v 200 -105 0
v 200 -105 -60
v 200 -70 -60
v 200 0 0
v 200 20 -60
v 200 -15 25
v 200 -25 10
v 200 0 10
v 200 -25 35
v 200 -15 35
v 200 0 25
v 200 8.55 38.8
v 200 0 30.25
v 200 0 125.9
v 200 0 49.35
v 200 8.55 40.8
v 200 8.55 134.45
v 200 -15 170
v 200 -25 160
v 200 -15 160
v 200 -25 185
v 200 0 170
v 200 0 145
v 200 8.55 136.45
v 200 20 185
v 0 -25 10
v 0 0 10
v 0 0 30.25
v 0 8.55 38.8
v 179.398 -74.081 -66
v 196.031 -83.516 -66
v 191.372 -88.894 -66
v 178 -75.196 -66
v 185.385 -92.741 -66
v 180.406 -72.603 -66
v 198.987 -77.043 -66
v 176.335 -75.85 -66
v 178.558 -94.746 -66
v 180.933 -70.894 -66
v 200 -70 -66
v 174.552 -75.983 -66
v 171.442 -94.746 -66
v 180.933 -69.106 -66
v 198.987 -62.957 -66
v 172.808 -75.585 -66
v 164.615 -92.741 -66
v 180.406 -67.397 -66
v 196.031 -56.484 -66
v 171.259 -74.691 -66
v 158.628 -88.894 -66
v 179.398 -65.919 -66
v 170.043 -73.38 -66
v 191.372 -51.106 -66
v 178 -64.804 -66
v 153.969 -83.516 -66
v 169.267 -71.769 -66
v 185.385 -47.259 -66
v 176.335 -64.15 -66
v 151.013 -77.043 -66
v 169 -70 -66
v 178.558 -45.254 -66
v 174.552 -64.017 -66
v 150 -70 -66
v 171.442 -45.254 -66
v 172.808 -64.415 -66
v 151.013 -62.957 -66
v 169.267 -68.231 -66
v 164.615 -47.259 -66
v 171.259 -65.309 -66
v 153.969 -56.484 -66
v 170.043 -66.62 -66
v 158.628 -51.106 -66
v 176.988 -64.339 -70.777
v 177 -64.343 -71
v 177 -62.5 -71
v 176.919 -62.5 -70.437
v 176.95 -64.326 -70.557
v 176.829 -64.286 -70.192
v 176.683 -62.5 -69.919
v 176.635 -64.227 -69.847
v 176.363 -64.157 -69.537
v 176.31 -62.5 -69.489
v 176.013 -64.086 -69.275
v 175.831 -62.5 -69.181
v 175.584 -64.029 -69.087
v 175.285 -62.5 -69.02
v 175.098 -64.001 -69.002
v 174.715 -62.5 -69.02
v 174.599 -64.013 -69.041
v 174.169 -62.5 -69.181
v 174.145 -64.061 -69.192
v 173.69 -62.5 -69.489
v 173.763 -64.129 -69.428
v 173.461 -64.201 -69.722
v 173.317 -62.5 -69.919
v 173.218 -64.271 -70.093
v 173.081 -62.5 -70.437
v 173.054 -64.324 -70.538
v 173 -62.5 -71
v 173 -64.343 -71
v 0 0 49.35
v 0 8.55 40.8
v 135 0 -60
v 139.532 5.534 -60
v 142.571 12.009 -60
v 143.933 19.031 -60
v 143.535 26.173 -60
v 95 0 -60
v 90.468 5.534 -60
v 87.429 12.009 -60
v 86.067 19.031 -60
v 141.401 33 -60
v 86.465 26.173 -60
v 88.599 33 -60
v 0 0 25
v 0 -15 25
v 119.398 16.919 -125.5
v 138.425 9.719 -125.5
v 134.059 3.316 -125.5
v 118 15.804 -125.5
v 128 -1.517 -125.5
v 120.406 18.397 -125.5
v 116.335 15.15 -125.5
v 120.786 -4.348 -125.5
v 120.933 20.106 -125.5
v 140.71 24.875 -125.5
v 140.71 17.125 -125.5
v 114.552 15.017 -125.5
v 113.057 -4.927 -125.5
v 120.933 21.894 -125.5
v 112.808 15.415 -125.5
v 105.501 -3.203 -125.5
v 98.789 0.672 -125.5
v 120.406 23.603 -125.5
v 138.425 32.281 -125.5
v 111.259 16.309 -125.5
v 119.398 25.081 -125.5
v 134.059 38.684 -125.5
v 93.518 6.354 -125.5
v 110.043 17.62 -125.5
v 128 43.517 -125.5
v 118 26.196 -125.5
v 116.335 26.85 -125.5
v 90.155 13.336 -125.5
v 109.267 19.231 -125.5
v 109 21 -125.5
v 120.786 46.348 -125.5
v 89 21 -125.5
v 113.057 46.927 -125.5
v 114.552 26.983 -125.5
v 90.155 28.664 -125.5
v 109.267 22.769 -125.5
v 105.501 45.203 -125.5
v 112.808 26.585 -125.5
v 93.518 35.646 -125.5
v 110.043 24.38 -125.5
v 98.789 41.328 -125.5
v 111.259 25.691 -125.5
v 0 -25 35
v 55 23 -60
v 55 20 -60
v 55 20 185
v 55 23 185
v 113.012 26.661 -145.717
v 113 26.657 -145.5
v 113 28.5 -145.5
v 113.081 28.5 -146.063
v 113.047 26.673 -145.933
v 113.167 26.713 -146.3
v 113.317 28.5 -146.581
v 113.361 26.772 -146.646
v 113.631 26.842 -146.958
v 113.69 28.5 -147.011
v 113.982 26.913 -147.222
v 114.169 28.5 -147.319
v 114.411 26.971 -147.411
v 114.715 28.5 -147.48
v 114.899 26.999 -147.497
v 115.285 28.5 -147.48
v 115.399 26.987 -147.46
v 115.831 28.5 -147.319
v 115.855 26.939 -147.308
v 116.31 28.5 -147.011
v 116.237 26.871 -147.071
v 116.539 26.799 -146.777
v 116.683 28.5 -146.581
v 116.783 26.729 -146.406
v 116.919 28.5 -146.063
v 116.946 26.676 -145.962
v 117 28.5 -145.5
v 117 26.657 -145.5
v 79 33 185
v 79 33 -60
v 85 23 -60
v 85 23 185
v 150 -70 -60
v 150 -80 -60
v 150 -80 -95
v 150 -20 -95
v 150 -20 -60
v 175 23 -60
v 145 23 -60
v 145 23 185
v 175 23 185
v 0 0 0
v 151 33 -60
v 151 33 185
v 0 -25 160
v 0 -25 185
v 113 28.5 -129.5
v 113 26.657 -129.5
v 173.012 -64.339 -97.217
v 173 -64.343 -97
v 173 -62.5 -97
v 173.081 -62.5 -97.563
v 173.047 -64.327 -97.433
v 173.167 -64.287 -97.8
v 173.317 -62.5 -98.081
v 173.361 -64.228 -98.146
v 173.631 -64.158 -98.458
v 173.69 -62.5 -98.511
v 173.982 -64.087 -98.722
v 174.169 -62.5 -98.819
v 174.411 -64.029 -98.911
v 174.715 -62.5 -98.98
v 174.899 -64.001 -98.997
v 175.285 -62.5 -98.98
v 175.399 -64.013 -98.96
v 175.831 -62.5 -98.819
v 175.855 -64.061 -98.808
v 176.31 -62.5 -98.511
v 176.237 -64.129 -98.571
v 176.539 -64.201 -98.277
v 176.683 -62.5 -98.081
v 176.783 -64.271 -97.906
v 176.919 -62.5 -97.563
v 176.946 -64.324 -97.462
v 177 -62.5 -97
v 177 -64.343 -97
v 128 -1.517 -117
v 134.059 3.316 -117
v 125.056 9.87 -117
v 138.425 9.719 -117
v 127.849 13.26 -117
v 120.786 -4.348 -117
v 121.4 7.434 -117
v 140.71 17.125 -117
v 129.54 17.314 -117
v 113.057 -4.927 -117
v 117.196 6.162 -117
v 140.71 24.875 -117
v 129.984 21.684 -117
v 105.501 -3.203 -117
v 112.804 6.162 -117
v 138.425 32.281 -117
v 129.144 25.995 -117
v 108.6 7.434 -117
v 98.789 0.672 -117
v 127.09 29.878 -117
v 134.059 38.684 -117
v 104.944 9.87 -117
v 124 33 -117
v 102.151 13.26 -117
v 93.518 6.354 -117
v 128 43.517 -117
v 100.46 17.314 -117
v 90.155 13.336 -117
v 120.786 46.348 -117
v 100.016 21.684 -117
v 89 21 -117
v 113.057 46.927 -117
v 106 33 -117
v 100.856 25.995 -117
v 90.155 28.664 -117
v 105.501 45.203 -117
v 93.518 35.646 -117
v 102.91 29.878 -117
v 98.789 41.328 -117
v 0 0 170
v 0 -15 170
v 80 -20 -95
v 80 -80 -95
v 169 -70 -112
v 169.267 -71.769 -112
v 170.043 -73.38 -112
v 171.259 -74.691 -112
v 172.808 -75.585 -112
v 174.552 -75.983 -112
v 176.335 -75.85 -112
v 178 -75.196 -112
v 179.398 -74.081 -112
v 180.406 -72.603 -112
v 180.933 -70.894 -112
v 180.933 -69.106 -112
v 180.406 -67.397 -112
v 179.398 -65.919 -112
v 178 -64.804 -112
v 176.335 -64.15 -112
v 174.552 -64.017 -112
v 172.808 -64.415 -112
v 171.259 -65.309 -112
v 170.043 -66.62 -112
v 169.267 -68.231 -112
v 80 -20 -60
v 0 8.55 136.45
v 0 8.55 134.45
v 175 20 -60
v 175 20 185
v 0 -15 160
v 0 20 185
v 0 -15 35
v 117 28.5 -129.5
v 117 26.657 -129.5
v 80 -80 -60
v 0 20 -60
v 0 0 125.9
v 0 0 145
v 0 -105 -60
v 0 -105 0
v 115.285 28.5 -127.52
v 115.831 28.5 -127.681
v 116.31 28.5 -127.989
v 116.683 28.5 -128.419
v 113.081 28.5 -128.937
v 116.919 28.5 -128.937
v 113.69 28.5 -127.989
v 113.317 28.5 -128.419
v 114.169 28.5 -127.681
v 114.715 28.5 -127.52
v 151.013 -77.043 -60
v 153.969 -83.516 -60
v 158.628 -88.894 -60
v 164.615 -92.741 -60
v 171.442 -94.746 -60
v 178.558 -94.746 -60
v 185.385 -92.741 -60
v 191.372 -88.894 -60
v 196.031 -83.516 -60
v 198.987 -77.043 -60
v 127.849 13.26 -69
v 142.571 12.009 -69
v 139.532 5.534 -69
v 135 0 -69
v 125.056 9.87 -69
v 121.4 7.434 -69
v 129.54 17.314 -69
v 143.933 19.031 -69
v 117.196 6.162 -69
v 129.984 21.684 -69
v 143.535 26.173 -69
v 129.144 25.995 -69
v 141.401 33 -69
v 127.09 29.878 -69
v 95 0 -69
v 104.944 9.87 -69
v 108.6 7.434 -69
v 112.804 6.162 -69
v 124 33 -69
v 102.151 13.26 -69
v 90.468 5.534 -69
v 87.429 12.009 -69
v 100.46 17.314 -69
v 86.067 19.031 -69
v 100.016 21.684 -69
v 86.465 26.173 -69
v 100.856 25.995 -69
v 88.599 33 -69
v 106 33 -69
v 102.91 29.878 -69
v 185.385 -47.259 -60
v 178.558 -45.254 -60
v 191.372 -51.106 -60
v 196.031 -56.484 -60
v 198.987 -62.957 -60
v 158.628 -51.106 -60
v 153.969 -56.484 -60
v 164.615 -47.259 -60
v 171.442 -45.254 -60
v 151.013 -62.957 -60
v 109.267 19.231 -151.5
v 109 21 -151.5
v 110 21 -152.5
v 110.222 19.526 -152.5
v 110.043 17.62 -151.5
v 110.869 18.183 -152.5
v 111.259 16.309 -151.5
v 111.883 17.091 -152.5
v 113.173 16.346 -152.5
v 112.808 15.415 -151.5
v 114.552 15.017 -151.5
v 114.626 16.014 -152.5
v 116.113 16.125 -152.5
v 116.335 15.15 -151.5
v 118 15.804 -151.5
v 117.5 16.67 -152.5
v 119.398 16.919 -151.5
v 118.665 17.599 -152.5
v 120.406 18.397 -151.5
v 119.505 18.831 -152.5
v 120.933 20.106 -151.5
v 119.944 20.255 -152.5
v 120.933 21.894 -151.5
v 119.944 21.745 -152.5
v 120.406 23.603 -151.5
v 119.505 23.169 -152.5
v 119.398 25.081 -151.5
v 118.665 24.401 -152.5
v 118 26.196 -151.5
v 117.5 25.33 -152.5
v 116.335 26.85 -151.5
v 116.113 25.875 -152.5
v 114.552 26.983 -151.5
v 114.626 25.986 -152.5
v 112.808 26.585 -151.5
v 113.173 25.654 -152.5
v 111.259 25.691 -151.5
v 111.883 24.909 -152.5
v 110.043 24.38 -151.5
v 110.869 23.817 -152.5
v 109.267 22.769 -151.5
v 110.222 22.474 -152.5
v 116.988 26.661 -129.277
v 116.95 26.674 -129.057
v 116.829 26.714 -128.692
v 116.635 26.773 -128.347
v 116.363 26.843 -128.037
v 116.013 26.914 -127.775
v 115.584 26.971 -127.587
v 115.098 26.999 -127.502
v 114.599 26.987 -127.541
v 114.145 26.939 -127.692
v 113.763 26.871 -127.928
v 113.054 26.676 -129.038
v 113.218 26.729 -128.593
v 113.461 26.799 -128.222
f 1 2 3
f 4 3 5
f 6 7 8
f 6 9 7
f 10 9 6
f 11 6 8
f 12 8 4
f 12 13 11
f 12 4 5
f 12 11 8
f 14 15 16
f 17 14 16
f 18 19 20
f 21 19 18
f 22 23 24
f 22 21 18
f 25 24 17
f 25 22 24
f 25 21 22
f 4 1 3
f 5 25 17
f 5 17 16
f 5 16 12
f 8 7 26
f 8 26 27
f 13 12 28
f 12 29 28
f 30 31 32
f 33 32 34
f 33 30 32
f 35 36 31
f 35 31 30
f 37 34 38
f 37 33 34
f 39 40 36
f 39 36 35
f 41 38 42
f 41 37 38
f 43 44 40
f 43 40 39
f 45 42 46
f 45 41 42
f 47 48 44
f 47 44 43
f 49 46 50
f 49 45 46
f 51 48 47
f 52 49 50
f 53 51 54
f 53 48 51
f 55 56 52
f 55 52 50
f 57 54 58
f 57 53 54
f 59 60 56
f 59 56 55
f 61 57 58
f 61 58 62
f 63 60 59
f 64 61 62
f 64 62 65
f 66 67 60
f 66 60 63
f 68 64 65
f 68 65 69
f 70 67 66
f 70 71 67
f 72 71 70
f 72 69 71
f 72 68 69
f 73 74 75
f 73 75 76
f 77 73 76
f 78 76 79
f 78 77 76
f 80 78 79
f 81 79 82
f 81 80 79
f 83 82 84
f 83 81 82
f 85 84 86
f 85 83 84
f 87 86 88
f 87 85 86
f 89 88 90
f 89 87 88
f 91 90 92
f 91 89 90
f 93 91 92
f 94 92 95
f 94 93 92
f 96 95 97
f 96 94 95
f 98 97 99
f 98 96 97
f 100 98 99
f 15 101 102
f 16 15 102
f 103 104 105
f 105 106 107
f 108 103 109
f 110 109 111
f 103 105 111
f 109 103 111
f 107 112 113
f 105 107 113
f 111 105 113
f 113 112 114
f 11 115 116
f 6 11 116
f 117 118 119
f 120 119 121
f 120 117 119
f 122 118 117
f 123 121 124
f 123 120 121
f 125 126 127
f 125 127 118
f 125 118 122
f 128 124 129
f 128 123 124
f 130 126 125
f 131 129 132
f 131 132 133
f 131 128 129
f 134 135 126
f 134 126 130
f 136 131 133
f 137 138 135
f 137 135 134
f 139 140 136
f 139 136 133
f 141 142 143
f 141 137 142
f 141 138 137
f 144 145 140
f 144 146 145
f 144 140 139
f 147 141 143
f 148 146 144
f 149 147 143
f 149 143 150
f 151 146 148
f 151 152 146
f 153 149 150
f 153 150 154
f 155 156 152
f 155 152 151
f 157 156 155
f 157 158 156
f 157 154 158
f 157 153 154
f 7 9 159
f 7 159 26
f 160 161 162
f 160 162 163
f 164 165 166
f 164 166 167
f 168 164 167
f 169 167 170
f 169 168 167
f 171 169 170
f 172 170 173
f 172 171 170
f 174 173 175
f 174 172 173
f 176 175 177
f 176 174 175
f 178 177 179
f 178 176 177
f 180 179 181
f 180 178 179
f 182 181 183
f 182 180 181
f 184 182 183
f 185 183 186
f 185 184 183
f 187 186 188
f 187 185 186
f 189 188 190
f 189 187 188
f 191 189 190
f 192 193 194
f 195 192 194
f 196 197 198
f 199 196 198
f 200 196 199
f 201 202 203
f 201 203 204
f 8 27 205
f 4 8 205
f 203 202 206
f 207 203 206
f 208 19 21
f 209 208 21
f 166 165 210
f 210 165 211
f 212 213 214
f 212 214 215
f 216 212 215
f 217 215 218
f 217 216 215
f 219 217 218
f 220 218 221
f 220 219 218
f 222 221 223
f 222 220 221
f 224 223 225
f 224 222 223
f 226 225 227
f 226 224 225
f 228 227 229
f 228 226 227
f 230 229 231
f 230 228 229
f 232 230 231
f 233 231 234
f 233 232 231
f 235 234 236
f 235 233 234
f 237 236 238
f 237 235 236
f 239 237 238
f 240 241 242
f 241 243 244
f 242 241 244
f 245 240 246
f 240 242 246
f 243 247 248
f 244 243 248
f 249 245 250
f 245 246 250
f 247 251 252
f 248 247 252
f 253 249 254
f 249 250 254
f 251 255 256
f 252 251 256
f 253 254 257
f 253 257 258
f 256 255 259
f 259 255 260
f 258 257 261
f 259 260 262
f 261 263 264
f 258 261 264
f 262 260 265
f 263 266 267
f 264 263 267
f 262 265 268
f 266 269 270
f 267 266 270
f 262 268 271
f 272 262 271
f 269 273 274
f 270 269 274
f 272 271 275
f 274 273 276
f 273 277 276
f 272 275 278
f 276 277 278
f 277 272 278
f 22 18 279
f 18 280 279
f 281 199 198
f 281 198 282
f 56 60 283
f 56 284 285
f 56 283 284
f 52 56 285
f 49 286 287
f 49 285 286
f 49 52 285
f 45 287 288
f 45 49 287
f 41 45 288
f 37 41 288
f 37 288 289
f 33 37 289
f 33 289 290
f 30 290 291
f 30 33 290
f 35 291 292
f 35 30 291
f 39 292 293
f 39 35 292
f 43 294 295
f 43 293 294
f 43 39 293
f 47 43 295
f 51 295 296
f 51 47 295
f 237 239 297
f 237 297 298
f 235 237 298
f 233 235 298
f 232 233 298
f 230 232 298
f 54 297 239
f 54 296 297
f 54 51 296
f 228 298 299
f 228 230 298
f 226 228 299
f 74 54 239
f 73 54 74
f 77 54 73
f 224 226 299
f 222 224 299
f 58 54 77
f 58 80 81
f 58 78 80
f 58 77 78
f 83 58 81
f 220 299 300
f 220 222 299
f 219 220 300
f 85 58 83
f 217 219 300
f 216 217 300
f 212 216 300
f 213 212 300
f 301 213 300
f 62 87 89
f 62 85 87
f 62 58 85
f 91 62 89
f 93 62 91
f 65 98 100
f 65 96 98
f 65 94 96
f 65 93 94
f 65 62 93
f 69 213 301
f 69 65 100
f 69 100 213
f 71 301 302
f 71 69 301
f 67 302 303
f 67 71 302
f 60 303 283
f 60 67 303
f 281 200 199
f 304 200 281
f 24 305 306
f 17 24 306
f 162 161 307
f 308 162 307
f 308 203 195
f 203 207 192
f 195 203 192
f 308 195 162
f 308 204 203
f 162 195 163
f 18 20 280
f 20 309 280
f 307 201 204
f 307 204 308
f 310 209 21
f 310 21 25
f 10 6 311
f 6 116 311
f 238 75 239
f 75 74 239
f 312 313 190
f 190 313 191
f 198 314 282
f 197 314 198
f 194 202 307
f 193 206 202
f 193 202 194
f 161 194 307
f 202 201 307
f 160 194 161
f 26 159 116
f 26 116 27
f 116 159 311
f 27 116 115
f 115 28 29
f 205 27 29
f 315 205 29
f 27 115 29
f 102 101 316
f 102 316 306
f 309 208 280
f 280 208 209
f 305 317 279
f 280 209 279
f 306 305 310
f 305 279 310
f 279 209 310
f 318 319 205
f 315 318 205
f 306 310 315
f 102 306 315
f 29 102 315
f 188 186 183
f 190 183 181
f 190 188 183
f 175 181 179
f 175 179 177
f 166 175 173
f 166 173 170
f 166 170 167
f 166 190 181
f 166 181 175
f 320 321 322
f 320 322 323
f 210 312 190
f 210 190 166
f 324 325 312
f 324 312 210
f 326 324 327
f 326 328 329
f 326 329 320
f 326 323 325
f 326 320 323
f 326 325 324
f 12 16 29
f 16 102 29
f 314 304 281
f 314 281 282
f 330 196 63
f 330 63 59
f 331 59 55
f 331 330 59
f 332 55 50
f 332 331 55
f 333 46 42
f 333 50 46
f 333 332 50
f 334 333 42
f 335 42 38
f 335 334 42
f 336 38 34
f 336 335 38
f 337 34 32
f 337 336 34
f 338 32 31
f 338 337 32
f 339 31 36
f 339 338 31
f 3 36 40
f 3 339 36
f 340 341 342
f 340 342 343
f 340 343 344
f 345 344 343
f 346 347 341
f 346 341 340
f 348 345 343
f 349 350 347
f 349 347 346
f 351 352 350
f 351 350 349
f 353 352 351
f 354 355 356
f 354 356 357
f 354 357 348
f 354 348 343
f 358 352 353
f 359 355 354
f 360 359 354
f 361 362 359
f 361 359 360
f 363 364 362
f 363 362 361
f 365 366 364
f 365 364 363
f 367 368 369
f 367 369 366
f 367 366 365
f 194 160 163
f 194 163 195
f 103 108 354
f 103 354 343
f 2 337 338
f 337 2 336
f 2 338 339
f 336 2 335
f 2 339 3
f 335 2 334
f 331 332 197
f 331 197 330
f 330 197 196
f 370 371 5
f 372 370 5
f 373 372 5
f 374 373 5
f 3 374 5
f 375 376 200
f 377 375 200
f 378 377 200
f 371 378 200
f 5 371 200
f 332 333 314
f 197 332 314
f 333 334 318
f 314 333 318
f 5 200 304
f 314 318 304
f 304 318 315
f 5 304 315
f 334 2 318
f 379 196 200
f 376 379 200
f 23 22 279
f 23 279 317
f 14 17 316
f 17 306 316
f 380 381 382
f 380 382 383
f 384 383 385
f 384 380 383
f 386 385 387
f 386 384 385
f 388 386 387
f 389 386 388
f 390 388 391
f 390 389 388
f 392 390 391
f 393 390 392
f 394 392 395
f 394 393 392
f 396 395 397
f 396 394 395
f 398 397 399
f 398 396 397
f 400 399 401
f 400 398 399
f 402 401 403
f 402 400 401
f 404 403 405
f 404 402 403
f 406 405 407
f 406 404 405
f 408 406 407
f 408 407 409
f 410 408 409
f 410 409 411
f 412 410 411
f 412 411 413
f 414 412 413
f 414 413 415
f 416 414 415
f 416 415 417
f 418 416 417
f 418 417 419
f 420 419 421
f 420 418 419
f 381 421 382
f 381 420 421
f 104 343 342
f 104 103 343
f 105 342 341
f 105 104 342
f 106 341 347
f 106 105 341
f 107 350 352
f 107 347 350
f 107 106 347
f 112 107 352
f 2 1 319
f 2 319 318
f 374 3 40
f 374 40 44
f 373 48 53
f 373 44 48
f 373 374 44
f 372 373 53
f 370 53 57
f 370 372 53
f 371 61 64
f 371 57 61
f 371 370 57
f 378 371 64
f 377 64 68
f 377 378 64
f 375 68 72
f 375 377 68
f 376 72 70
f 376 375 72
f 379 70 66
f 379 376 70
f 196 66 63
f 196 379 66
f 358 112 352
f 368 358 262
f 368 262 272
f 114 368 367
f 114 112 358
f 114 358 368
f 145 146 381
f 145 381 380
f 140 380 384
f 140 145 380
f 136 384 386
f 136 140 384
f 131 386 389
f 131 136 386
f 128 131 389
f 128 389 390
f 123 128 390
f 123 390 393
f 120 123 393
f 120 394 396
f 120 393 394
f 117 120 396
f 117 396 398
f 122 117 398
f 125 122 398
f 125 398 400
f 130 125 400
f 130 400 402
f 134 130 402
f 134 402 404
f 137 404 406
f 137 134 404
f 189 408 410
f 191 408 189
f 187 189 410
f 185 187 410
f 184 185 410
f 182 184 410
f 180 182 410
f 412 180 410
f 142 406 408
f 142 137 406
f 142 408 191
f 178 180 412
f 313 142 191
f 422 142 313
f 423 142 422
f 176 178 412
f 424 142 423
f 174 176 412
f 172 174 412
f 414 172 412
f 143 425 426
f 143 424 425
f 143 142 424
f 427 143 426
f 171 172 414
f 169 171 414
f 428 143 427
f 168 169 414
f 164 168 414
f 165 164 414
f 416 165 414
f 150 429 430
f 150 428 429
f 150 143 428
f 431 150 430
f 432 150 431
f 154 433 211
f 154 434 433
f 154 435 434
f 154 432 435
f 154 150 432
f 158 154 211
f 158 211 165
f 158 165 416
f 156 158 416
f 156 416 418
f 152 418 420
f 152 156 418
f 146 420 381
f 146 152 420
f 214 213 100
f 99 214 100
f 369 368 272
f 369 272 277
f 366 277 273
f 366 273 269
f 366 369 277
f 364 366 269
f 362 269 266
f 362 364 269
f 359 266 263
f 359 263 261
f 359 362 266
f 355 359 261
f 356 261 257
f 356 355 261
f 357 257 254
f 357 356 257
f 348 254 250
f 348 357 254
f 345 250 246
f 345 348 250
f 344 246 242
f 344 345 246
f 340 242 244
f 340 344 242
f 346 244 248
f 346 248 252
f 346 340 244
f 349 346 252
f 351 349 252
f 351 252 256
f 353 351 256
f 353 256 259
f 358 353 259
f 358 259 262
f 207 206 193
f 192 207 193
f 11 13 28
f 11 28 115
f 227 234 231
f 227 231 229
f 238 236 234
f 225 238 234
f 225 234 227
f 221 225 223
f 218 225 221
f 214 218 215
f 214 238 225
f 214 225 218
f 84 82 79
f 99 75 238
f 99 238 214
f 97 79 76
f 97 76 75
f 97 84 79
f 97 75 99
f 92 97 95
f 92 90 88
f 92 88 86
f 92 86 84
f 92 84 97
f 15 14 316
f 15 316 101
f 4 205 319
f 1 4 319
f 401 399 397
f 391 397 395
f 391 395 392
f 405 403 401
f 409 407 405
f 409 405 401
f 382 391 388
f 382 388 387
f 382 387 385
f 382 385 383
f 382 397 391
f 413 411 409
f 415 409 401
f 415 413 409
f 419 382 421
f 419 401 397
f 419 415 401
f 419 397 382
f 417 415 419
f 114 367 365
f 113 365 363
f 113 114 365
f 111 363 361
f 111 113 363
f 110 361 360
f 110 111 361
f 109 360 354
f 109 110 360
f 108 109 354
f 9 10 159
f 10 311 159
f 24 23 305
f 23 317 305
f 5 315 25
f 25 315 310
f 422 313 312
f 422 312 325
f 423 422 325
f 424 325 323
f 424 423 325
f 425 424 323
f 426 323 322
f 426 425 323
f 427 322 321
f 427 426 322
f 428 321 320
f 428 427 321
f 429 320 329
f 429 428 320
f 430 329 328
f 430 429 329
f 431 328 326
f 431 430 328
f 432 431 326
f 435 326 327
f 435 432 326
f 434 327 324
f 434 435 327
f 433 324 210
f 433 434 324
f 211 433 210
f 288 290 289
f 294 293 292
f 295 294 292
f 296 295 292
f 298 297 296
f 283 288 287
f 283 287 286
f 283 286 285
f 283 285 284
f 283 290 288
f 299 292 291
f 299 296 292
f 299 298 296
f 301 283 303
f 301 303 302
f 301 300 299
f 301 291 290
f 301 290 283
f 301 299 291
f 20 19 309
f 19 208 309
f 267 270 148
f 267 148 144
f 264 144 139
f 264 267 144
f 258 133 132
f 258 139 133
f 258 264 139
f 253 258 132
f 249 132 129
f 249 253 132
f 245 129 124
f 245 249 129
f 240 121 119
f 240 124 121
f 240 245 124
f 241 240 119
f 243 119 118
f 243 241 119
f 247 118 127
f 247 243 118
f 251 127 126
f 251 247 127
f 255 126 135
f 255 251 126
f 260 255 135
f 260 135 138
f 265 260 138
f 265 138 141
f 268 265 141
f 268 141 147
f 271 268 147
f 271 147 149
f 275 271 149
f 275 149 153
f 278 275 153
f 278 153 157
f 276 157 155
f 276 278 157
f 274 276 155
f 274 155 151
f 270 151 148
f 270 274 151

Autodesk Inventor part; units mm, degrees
ref_plane "YZ Plane" through (0, 0, 0) normal (1, 0, 0) x (0, 1, 0)
sketch "Sketch1" plane through (0, 0, 0) normal (1, 0, 0) x (0, 1, 0)
  line L0 (0, 0) -> (-105, 0)
  line L1 (-105, 0) -> (-105, -60)
  line L2 (-105, -60) -> (20, -60)
  line L3 (20, -60) -> (20, 185)
  line L4 (20, 185) -> (-15.7857, 185)
  line L5 (0, 145) -> (8.55, 136.45)
  line L6 (8.55, 136.45) -> (8.55, 134.45)
  line L7 (8.55, 134.45) -> (0, 125.9)
  line L8 (0, 125.9) -> (0, 49.35)
  line L9 (0, 49.35) -> (8.55, 40.8)
  line L10 (8.55, 40.8) -> (8.55, 38.8)
  line L11 (8.55, 38.8) -> (0, 30.25)
  line L12 (0, 30.25) -> (0, 25)
  line L13 (0, 25) -> (-15, 25)
  line L14 (-15, 25) -> (-15, 35)
  line L15 (-15, 35) -> (-25, 35)
  line L16 (-25, 35) -> (-25, 10)
  line L17 (-25, 10) -> (0, 10)
  line L18 (0, 10) -> (0, 0)
  line L19 (-25, 160) -> (-25, 185)
  line L20 (-25, 185) -> (-15.7857, 185)
  line L21 (-25, 160) -> (-15, 160)
  line L22 (-15, 160) -> (-15, 170)
  line L23 (-15, 170) -> (0, 170)
  line L24 (0, 170) -> (0, 145)
  line L25 (0, 145) -> (0, 136.45) construction
  line L26 (0, 136.45) -> (8.55, 136.45) construction
  line L27 (0, 125.9) -> (0, 134.45) construction
  line L28 (0, 134.45) -> (8.55, 134.45) construction
  line L29 (0, 49.35) -> (0, 40.8) construction
  line L30 (0, 40.8) -> (8.55, 40.8) construction
  line L31 (0, 30.25) -> (0, 38.8) construction
  line L32 (0, 38.8) -> (8.55, 38.8) construction
  dimension "d0" = 245
  dimension "d1" = 125
  dimension "d2" = 60
  dimension "d3" = 45
  dimension "d4" = 20
  dimension "d5" = 10
  dimension "d6" = 15
  dimension "d7" = 15
  dimension "d8" = 25
  dimension "d9" = 25
  dimension "d10" = 10
  dimension "d11" = 40
  dimension "d14" = 114.75
  dimension "d15" = 2
  dimension "d16" = 8.55
extrude "Extrusion1" add sketch "Sketch1" along normal blind 200
sketch "Sketch2" plane through (0, -105, -60) normal (0, 0, -1) x (-1, 0, 0)
  line L0 (0, 125) -> (-200, 125) projected
  line L1 (-175, 125) -> (-55, 125)
  line L2 (-55, 125) -> (-55, 128)
  line L3 (-55, 128) -> (-175, 128)
  line L4 (-175, 128) -> (-175, 125)
  line L5 (-145, 128) -> (-151, 138)
  line L6 (-151, 138) -> (-79, 138)
  line L7 (-79, 138) -> (-85, 128)
  line L8 (-200, 0) -> (-200, 125) projected
  line L9 (-115, 138) -> (-115, 128) construction
  point P0 (0, 105)
  dimension "d17" = 25
  dimension "d18" = 120
  dimension "d19" = 3
  dimension "d20" = 10
  dimension "d21" = 72
  dimension "d22" = 6
  dimension "d23" = 6
extrude "Extrusion2" add sketch "Sketch2" against normal up to surface (245 mm away) separate body
sketch "Sketch3" plane through (0, -105, -60) normal (0, 0, -1) x (-1, 0, 0)
  line L0 (-150, 85) -> (-80, 85)
  line L1 (-80, 85) -> (-80, 25)
  line L2 (-80, 25) -> (-150, 25)
  line L3 (-150, 25) -> (-150, 85)
  line L4 (-200, 0) -> (-200, 125) projected
  line L5 (0, 0) -> (-200, 0) projected
  point P0 (0, 105)
  dimension "d26" = 70
  dimension "d27" = 60
  dimension "d28" = 50
  dimension "d29" = 25
extrude "Extrusion3" add sketch "Sketch3" along normal blind 35 bodies 1
sketch "Sketch5" plane through (0, -105, -60) normal (0, 0, -1) x (-1, 0, 0)
  circle A0 centre (-115, 126) radius 29
  circle A1 centre (-115, 126) radius 15
  line L0 (-56.8289, 105) -> (-173.1711, 105)
  line L1 (-173.1711, 105) -> (-173.1711, 138)
  line L2 (-173.1711, 138) -> (-56.8289, 138)
  line L3 (-56.8289, 138) -> (-56.8289, 105)
  line L4 (-56.8289, 105) -> (-173.1711, 138) construction
  line L5 (-173.1711, 105) -> (-56.8289, 138) construction
  line L6 (-144.4606, 111) -> (-81.6028, 111) construction
  line L7 (-79, 138) -> (-151, 138) construction
  line L8 (-115, 138) -> (-115, 126) construction
  point P0 (0, 105)
  point P1 (-115, 121.5)
  point P2 (-88.5992, 138)
  point P3 (-106, 138)
  point P4 (-124, 138)
  point P5 (-141.4008, 138)
  point P6 (-135, 105)
  point P7 (-95, 105)
  dimension "d32" = 58
  dimension "d33" = 30
  dimension "d34" = 33
  dimension "d35" = 27
extrude "Extrusion4" add sketch "Sketch5" along normal blind 9 separate body contours A0 L0 L2 A1
extrude "Extrusion5" add sketch "Sketch5" along normal blind 57 contours A1 L2 picked at (-114.6834, 128.2311) bodies 3
sketch "Sketch6" plane through (0, -105, -117) normal (0, 0, -1) x (-1, 0, 0)
  arc A0 (-124, 138) -> (-106, 138) centre (-115, 126) ccw projected
  circle A1 centre (-115, 126) radius 26
  point P0 (0, 105)
  dimension "d40" = 52
extrude "Extrusion6" add sketch "Sketch6" along normal blind 8.5 bodies 3
sketch "Sketch7" plane through (115, 21, -125.5) normal (0, 0, -1) x (-1, 0, 0)
  circle A0 centre (0, 0) radius 26 projected
  circle A1 centre (0, 0) radius 6
  point P0 (115, -21)
  dimension "d43" = 12
extrude "Extrusion7" add sketch "Sketch7" along normal blind 27 contours A1 bodies 3
sketch "Sketch8" plane through (0, 0, 0) normal (0, 1, 0) x (-1, 0, 0)
  point P0 (0, 0)
ref_plane "Work Plane1" through (115, 27, -125.5) normal (0, 1, 0) x (-1, 0, 0)
sketch "Sketch9" plane through (115, 27, -125.5) normal (0, 1, 0) x (-1, 0, 0)
  line L0 (0, -2) -> (0, -22) construction
  line L1 (-2, -4) -> (-2, -20)
  line L2 (2, -20) -> (2, -4)
  arc A0 (2, -4) -> (-2, -4) centre (0, -4) ccw
  arc A1 (-2, -20) -> (2, -20) centre (0, -20) ccw
  line L3 (-6, -27) -> (6, -27) construction
  line L4 (0, -27) -> (0, -22) construction
  point P0 (115, 125.5)
  point P1 (0, -12)
  point P2 (0, -2)
  dimension "d46" = 4
  dimension "d47" = 20
  dimension "d48" = 5
extrude "Extrusion8" add sketch "Sketch9" along normal blind 1.5 and the other way blind 1.25 bodies 3
chamfer "Chamfer1" distance 1 angle 45 1 edges at (121, 21, -152.5)
sketch "Sketch10" plane through (0, -105, -60) normal (0, 0, -1) x (-1, 0, 0)
  circle A0 centre (-175, 35) radius 25
  line L0 (-200, 0) -> (-200, 125) projected
  line L1 (-205.8854, 10) -> (-128.3564, 10) construction
  line L2 (0, 0) -> (-200, 0) construction
  point P0 (0, 105)
  dimension "d56" = 50
  dimension "d57" = 10
extrude "Extrusion9" add sketch "Sketch10" along normal blind 6 bodies 1
sketch "Sketch11" plane through (175, -70, -66) normal (0, 0, -1) x (-1, 0, 0)
  arc A0 (25, 0) -> (-25, 0) centre (0, 0) ccw projected
  circle A1 centre (0, 0) radius 6
  point P0 (175, 70)
  dimension "d60" = 12
extrude "Extrusion10" add sketch "Sketch11" along normal blind 46 bodies 1
ref_plane "Work Plane2" through (175, -64, -66) normal (0, 1, 0) x (-1, 0, 0)
sketch "Sketch12" plane through (175, -64, -66) normal (0, 1, 0) x (-1, 0, 0)
  line L0 (0, -3) -> (0, -33) construction
  line L1 (-2, -5) -> (-2, -31)
  line L2 (2, -31) -> (2, -5)
  arc A0 (2, -5) -> (-2, -5) centre (0, -5) ccw
  arc A1 (-2, -31) -> (2, -31) centre (0, -31) ccw
  line L3 (0, -33) -> (0, -46) construction
  line L4 (-6, -46) -> (6, -46) construction
  point P0 (175, 66)
  point P1 (0, -18)
  point P2 (0, -33)
  point P3 (0, -3)
  dimension "d63" = 4
  dimension "d68" = 30
  dimension "d69" = 13
extrude "Extrusion11" add sketch "Sketch12" along normal blind 1.5 and the other way blind 1.5 bodies 1
properties part number "Apron"
